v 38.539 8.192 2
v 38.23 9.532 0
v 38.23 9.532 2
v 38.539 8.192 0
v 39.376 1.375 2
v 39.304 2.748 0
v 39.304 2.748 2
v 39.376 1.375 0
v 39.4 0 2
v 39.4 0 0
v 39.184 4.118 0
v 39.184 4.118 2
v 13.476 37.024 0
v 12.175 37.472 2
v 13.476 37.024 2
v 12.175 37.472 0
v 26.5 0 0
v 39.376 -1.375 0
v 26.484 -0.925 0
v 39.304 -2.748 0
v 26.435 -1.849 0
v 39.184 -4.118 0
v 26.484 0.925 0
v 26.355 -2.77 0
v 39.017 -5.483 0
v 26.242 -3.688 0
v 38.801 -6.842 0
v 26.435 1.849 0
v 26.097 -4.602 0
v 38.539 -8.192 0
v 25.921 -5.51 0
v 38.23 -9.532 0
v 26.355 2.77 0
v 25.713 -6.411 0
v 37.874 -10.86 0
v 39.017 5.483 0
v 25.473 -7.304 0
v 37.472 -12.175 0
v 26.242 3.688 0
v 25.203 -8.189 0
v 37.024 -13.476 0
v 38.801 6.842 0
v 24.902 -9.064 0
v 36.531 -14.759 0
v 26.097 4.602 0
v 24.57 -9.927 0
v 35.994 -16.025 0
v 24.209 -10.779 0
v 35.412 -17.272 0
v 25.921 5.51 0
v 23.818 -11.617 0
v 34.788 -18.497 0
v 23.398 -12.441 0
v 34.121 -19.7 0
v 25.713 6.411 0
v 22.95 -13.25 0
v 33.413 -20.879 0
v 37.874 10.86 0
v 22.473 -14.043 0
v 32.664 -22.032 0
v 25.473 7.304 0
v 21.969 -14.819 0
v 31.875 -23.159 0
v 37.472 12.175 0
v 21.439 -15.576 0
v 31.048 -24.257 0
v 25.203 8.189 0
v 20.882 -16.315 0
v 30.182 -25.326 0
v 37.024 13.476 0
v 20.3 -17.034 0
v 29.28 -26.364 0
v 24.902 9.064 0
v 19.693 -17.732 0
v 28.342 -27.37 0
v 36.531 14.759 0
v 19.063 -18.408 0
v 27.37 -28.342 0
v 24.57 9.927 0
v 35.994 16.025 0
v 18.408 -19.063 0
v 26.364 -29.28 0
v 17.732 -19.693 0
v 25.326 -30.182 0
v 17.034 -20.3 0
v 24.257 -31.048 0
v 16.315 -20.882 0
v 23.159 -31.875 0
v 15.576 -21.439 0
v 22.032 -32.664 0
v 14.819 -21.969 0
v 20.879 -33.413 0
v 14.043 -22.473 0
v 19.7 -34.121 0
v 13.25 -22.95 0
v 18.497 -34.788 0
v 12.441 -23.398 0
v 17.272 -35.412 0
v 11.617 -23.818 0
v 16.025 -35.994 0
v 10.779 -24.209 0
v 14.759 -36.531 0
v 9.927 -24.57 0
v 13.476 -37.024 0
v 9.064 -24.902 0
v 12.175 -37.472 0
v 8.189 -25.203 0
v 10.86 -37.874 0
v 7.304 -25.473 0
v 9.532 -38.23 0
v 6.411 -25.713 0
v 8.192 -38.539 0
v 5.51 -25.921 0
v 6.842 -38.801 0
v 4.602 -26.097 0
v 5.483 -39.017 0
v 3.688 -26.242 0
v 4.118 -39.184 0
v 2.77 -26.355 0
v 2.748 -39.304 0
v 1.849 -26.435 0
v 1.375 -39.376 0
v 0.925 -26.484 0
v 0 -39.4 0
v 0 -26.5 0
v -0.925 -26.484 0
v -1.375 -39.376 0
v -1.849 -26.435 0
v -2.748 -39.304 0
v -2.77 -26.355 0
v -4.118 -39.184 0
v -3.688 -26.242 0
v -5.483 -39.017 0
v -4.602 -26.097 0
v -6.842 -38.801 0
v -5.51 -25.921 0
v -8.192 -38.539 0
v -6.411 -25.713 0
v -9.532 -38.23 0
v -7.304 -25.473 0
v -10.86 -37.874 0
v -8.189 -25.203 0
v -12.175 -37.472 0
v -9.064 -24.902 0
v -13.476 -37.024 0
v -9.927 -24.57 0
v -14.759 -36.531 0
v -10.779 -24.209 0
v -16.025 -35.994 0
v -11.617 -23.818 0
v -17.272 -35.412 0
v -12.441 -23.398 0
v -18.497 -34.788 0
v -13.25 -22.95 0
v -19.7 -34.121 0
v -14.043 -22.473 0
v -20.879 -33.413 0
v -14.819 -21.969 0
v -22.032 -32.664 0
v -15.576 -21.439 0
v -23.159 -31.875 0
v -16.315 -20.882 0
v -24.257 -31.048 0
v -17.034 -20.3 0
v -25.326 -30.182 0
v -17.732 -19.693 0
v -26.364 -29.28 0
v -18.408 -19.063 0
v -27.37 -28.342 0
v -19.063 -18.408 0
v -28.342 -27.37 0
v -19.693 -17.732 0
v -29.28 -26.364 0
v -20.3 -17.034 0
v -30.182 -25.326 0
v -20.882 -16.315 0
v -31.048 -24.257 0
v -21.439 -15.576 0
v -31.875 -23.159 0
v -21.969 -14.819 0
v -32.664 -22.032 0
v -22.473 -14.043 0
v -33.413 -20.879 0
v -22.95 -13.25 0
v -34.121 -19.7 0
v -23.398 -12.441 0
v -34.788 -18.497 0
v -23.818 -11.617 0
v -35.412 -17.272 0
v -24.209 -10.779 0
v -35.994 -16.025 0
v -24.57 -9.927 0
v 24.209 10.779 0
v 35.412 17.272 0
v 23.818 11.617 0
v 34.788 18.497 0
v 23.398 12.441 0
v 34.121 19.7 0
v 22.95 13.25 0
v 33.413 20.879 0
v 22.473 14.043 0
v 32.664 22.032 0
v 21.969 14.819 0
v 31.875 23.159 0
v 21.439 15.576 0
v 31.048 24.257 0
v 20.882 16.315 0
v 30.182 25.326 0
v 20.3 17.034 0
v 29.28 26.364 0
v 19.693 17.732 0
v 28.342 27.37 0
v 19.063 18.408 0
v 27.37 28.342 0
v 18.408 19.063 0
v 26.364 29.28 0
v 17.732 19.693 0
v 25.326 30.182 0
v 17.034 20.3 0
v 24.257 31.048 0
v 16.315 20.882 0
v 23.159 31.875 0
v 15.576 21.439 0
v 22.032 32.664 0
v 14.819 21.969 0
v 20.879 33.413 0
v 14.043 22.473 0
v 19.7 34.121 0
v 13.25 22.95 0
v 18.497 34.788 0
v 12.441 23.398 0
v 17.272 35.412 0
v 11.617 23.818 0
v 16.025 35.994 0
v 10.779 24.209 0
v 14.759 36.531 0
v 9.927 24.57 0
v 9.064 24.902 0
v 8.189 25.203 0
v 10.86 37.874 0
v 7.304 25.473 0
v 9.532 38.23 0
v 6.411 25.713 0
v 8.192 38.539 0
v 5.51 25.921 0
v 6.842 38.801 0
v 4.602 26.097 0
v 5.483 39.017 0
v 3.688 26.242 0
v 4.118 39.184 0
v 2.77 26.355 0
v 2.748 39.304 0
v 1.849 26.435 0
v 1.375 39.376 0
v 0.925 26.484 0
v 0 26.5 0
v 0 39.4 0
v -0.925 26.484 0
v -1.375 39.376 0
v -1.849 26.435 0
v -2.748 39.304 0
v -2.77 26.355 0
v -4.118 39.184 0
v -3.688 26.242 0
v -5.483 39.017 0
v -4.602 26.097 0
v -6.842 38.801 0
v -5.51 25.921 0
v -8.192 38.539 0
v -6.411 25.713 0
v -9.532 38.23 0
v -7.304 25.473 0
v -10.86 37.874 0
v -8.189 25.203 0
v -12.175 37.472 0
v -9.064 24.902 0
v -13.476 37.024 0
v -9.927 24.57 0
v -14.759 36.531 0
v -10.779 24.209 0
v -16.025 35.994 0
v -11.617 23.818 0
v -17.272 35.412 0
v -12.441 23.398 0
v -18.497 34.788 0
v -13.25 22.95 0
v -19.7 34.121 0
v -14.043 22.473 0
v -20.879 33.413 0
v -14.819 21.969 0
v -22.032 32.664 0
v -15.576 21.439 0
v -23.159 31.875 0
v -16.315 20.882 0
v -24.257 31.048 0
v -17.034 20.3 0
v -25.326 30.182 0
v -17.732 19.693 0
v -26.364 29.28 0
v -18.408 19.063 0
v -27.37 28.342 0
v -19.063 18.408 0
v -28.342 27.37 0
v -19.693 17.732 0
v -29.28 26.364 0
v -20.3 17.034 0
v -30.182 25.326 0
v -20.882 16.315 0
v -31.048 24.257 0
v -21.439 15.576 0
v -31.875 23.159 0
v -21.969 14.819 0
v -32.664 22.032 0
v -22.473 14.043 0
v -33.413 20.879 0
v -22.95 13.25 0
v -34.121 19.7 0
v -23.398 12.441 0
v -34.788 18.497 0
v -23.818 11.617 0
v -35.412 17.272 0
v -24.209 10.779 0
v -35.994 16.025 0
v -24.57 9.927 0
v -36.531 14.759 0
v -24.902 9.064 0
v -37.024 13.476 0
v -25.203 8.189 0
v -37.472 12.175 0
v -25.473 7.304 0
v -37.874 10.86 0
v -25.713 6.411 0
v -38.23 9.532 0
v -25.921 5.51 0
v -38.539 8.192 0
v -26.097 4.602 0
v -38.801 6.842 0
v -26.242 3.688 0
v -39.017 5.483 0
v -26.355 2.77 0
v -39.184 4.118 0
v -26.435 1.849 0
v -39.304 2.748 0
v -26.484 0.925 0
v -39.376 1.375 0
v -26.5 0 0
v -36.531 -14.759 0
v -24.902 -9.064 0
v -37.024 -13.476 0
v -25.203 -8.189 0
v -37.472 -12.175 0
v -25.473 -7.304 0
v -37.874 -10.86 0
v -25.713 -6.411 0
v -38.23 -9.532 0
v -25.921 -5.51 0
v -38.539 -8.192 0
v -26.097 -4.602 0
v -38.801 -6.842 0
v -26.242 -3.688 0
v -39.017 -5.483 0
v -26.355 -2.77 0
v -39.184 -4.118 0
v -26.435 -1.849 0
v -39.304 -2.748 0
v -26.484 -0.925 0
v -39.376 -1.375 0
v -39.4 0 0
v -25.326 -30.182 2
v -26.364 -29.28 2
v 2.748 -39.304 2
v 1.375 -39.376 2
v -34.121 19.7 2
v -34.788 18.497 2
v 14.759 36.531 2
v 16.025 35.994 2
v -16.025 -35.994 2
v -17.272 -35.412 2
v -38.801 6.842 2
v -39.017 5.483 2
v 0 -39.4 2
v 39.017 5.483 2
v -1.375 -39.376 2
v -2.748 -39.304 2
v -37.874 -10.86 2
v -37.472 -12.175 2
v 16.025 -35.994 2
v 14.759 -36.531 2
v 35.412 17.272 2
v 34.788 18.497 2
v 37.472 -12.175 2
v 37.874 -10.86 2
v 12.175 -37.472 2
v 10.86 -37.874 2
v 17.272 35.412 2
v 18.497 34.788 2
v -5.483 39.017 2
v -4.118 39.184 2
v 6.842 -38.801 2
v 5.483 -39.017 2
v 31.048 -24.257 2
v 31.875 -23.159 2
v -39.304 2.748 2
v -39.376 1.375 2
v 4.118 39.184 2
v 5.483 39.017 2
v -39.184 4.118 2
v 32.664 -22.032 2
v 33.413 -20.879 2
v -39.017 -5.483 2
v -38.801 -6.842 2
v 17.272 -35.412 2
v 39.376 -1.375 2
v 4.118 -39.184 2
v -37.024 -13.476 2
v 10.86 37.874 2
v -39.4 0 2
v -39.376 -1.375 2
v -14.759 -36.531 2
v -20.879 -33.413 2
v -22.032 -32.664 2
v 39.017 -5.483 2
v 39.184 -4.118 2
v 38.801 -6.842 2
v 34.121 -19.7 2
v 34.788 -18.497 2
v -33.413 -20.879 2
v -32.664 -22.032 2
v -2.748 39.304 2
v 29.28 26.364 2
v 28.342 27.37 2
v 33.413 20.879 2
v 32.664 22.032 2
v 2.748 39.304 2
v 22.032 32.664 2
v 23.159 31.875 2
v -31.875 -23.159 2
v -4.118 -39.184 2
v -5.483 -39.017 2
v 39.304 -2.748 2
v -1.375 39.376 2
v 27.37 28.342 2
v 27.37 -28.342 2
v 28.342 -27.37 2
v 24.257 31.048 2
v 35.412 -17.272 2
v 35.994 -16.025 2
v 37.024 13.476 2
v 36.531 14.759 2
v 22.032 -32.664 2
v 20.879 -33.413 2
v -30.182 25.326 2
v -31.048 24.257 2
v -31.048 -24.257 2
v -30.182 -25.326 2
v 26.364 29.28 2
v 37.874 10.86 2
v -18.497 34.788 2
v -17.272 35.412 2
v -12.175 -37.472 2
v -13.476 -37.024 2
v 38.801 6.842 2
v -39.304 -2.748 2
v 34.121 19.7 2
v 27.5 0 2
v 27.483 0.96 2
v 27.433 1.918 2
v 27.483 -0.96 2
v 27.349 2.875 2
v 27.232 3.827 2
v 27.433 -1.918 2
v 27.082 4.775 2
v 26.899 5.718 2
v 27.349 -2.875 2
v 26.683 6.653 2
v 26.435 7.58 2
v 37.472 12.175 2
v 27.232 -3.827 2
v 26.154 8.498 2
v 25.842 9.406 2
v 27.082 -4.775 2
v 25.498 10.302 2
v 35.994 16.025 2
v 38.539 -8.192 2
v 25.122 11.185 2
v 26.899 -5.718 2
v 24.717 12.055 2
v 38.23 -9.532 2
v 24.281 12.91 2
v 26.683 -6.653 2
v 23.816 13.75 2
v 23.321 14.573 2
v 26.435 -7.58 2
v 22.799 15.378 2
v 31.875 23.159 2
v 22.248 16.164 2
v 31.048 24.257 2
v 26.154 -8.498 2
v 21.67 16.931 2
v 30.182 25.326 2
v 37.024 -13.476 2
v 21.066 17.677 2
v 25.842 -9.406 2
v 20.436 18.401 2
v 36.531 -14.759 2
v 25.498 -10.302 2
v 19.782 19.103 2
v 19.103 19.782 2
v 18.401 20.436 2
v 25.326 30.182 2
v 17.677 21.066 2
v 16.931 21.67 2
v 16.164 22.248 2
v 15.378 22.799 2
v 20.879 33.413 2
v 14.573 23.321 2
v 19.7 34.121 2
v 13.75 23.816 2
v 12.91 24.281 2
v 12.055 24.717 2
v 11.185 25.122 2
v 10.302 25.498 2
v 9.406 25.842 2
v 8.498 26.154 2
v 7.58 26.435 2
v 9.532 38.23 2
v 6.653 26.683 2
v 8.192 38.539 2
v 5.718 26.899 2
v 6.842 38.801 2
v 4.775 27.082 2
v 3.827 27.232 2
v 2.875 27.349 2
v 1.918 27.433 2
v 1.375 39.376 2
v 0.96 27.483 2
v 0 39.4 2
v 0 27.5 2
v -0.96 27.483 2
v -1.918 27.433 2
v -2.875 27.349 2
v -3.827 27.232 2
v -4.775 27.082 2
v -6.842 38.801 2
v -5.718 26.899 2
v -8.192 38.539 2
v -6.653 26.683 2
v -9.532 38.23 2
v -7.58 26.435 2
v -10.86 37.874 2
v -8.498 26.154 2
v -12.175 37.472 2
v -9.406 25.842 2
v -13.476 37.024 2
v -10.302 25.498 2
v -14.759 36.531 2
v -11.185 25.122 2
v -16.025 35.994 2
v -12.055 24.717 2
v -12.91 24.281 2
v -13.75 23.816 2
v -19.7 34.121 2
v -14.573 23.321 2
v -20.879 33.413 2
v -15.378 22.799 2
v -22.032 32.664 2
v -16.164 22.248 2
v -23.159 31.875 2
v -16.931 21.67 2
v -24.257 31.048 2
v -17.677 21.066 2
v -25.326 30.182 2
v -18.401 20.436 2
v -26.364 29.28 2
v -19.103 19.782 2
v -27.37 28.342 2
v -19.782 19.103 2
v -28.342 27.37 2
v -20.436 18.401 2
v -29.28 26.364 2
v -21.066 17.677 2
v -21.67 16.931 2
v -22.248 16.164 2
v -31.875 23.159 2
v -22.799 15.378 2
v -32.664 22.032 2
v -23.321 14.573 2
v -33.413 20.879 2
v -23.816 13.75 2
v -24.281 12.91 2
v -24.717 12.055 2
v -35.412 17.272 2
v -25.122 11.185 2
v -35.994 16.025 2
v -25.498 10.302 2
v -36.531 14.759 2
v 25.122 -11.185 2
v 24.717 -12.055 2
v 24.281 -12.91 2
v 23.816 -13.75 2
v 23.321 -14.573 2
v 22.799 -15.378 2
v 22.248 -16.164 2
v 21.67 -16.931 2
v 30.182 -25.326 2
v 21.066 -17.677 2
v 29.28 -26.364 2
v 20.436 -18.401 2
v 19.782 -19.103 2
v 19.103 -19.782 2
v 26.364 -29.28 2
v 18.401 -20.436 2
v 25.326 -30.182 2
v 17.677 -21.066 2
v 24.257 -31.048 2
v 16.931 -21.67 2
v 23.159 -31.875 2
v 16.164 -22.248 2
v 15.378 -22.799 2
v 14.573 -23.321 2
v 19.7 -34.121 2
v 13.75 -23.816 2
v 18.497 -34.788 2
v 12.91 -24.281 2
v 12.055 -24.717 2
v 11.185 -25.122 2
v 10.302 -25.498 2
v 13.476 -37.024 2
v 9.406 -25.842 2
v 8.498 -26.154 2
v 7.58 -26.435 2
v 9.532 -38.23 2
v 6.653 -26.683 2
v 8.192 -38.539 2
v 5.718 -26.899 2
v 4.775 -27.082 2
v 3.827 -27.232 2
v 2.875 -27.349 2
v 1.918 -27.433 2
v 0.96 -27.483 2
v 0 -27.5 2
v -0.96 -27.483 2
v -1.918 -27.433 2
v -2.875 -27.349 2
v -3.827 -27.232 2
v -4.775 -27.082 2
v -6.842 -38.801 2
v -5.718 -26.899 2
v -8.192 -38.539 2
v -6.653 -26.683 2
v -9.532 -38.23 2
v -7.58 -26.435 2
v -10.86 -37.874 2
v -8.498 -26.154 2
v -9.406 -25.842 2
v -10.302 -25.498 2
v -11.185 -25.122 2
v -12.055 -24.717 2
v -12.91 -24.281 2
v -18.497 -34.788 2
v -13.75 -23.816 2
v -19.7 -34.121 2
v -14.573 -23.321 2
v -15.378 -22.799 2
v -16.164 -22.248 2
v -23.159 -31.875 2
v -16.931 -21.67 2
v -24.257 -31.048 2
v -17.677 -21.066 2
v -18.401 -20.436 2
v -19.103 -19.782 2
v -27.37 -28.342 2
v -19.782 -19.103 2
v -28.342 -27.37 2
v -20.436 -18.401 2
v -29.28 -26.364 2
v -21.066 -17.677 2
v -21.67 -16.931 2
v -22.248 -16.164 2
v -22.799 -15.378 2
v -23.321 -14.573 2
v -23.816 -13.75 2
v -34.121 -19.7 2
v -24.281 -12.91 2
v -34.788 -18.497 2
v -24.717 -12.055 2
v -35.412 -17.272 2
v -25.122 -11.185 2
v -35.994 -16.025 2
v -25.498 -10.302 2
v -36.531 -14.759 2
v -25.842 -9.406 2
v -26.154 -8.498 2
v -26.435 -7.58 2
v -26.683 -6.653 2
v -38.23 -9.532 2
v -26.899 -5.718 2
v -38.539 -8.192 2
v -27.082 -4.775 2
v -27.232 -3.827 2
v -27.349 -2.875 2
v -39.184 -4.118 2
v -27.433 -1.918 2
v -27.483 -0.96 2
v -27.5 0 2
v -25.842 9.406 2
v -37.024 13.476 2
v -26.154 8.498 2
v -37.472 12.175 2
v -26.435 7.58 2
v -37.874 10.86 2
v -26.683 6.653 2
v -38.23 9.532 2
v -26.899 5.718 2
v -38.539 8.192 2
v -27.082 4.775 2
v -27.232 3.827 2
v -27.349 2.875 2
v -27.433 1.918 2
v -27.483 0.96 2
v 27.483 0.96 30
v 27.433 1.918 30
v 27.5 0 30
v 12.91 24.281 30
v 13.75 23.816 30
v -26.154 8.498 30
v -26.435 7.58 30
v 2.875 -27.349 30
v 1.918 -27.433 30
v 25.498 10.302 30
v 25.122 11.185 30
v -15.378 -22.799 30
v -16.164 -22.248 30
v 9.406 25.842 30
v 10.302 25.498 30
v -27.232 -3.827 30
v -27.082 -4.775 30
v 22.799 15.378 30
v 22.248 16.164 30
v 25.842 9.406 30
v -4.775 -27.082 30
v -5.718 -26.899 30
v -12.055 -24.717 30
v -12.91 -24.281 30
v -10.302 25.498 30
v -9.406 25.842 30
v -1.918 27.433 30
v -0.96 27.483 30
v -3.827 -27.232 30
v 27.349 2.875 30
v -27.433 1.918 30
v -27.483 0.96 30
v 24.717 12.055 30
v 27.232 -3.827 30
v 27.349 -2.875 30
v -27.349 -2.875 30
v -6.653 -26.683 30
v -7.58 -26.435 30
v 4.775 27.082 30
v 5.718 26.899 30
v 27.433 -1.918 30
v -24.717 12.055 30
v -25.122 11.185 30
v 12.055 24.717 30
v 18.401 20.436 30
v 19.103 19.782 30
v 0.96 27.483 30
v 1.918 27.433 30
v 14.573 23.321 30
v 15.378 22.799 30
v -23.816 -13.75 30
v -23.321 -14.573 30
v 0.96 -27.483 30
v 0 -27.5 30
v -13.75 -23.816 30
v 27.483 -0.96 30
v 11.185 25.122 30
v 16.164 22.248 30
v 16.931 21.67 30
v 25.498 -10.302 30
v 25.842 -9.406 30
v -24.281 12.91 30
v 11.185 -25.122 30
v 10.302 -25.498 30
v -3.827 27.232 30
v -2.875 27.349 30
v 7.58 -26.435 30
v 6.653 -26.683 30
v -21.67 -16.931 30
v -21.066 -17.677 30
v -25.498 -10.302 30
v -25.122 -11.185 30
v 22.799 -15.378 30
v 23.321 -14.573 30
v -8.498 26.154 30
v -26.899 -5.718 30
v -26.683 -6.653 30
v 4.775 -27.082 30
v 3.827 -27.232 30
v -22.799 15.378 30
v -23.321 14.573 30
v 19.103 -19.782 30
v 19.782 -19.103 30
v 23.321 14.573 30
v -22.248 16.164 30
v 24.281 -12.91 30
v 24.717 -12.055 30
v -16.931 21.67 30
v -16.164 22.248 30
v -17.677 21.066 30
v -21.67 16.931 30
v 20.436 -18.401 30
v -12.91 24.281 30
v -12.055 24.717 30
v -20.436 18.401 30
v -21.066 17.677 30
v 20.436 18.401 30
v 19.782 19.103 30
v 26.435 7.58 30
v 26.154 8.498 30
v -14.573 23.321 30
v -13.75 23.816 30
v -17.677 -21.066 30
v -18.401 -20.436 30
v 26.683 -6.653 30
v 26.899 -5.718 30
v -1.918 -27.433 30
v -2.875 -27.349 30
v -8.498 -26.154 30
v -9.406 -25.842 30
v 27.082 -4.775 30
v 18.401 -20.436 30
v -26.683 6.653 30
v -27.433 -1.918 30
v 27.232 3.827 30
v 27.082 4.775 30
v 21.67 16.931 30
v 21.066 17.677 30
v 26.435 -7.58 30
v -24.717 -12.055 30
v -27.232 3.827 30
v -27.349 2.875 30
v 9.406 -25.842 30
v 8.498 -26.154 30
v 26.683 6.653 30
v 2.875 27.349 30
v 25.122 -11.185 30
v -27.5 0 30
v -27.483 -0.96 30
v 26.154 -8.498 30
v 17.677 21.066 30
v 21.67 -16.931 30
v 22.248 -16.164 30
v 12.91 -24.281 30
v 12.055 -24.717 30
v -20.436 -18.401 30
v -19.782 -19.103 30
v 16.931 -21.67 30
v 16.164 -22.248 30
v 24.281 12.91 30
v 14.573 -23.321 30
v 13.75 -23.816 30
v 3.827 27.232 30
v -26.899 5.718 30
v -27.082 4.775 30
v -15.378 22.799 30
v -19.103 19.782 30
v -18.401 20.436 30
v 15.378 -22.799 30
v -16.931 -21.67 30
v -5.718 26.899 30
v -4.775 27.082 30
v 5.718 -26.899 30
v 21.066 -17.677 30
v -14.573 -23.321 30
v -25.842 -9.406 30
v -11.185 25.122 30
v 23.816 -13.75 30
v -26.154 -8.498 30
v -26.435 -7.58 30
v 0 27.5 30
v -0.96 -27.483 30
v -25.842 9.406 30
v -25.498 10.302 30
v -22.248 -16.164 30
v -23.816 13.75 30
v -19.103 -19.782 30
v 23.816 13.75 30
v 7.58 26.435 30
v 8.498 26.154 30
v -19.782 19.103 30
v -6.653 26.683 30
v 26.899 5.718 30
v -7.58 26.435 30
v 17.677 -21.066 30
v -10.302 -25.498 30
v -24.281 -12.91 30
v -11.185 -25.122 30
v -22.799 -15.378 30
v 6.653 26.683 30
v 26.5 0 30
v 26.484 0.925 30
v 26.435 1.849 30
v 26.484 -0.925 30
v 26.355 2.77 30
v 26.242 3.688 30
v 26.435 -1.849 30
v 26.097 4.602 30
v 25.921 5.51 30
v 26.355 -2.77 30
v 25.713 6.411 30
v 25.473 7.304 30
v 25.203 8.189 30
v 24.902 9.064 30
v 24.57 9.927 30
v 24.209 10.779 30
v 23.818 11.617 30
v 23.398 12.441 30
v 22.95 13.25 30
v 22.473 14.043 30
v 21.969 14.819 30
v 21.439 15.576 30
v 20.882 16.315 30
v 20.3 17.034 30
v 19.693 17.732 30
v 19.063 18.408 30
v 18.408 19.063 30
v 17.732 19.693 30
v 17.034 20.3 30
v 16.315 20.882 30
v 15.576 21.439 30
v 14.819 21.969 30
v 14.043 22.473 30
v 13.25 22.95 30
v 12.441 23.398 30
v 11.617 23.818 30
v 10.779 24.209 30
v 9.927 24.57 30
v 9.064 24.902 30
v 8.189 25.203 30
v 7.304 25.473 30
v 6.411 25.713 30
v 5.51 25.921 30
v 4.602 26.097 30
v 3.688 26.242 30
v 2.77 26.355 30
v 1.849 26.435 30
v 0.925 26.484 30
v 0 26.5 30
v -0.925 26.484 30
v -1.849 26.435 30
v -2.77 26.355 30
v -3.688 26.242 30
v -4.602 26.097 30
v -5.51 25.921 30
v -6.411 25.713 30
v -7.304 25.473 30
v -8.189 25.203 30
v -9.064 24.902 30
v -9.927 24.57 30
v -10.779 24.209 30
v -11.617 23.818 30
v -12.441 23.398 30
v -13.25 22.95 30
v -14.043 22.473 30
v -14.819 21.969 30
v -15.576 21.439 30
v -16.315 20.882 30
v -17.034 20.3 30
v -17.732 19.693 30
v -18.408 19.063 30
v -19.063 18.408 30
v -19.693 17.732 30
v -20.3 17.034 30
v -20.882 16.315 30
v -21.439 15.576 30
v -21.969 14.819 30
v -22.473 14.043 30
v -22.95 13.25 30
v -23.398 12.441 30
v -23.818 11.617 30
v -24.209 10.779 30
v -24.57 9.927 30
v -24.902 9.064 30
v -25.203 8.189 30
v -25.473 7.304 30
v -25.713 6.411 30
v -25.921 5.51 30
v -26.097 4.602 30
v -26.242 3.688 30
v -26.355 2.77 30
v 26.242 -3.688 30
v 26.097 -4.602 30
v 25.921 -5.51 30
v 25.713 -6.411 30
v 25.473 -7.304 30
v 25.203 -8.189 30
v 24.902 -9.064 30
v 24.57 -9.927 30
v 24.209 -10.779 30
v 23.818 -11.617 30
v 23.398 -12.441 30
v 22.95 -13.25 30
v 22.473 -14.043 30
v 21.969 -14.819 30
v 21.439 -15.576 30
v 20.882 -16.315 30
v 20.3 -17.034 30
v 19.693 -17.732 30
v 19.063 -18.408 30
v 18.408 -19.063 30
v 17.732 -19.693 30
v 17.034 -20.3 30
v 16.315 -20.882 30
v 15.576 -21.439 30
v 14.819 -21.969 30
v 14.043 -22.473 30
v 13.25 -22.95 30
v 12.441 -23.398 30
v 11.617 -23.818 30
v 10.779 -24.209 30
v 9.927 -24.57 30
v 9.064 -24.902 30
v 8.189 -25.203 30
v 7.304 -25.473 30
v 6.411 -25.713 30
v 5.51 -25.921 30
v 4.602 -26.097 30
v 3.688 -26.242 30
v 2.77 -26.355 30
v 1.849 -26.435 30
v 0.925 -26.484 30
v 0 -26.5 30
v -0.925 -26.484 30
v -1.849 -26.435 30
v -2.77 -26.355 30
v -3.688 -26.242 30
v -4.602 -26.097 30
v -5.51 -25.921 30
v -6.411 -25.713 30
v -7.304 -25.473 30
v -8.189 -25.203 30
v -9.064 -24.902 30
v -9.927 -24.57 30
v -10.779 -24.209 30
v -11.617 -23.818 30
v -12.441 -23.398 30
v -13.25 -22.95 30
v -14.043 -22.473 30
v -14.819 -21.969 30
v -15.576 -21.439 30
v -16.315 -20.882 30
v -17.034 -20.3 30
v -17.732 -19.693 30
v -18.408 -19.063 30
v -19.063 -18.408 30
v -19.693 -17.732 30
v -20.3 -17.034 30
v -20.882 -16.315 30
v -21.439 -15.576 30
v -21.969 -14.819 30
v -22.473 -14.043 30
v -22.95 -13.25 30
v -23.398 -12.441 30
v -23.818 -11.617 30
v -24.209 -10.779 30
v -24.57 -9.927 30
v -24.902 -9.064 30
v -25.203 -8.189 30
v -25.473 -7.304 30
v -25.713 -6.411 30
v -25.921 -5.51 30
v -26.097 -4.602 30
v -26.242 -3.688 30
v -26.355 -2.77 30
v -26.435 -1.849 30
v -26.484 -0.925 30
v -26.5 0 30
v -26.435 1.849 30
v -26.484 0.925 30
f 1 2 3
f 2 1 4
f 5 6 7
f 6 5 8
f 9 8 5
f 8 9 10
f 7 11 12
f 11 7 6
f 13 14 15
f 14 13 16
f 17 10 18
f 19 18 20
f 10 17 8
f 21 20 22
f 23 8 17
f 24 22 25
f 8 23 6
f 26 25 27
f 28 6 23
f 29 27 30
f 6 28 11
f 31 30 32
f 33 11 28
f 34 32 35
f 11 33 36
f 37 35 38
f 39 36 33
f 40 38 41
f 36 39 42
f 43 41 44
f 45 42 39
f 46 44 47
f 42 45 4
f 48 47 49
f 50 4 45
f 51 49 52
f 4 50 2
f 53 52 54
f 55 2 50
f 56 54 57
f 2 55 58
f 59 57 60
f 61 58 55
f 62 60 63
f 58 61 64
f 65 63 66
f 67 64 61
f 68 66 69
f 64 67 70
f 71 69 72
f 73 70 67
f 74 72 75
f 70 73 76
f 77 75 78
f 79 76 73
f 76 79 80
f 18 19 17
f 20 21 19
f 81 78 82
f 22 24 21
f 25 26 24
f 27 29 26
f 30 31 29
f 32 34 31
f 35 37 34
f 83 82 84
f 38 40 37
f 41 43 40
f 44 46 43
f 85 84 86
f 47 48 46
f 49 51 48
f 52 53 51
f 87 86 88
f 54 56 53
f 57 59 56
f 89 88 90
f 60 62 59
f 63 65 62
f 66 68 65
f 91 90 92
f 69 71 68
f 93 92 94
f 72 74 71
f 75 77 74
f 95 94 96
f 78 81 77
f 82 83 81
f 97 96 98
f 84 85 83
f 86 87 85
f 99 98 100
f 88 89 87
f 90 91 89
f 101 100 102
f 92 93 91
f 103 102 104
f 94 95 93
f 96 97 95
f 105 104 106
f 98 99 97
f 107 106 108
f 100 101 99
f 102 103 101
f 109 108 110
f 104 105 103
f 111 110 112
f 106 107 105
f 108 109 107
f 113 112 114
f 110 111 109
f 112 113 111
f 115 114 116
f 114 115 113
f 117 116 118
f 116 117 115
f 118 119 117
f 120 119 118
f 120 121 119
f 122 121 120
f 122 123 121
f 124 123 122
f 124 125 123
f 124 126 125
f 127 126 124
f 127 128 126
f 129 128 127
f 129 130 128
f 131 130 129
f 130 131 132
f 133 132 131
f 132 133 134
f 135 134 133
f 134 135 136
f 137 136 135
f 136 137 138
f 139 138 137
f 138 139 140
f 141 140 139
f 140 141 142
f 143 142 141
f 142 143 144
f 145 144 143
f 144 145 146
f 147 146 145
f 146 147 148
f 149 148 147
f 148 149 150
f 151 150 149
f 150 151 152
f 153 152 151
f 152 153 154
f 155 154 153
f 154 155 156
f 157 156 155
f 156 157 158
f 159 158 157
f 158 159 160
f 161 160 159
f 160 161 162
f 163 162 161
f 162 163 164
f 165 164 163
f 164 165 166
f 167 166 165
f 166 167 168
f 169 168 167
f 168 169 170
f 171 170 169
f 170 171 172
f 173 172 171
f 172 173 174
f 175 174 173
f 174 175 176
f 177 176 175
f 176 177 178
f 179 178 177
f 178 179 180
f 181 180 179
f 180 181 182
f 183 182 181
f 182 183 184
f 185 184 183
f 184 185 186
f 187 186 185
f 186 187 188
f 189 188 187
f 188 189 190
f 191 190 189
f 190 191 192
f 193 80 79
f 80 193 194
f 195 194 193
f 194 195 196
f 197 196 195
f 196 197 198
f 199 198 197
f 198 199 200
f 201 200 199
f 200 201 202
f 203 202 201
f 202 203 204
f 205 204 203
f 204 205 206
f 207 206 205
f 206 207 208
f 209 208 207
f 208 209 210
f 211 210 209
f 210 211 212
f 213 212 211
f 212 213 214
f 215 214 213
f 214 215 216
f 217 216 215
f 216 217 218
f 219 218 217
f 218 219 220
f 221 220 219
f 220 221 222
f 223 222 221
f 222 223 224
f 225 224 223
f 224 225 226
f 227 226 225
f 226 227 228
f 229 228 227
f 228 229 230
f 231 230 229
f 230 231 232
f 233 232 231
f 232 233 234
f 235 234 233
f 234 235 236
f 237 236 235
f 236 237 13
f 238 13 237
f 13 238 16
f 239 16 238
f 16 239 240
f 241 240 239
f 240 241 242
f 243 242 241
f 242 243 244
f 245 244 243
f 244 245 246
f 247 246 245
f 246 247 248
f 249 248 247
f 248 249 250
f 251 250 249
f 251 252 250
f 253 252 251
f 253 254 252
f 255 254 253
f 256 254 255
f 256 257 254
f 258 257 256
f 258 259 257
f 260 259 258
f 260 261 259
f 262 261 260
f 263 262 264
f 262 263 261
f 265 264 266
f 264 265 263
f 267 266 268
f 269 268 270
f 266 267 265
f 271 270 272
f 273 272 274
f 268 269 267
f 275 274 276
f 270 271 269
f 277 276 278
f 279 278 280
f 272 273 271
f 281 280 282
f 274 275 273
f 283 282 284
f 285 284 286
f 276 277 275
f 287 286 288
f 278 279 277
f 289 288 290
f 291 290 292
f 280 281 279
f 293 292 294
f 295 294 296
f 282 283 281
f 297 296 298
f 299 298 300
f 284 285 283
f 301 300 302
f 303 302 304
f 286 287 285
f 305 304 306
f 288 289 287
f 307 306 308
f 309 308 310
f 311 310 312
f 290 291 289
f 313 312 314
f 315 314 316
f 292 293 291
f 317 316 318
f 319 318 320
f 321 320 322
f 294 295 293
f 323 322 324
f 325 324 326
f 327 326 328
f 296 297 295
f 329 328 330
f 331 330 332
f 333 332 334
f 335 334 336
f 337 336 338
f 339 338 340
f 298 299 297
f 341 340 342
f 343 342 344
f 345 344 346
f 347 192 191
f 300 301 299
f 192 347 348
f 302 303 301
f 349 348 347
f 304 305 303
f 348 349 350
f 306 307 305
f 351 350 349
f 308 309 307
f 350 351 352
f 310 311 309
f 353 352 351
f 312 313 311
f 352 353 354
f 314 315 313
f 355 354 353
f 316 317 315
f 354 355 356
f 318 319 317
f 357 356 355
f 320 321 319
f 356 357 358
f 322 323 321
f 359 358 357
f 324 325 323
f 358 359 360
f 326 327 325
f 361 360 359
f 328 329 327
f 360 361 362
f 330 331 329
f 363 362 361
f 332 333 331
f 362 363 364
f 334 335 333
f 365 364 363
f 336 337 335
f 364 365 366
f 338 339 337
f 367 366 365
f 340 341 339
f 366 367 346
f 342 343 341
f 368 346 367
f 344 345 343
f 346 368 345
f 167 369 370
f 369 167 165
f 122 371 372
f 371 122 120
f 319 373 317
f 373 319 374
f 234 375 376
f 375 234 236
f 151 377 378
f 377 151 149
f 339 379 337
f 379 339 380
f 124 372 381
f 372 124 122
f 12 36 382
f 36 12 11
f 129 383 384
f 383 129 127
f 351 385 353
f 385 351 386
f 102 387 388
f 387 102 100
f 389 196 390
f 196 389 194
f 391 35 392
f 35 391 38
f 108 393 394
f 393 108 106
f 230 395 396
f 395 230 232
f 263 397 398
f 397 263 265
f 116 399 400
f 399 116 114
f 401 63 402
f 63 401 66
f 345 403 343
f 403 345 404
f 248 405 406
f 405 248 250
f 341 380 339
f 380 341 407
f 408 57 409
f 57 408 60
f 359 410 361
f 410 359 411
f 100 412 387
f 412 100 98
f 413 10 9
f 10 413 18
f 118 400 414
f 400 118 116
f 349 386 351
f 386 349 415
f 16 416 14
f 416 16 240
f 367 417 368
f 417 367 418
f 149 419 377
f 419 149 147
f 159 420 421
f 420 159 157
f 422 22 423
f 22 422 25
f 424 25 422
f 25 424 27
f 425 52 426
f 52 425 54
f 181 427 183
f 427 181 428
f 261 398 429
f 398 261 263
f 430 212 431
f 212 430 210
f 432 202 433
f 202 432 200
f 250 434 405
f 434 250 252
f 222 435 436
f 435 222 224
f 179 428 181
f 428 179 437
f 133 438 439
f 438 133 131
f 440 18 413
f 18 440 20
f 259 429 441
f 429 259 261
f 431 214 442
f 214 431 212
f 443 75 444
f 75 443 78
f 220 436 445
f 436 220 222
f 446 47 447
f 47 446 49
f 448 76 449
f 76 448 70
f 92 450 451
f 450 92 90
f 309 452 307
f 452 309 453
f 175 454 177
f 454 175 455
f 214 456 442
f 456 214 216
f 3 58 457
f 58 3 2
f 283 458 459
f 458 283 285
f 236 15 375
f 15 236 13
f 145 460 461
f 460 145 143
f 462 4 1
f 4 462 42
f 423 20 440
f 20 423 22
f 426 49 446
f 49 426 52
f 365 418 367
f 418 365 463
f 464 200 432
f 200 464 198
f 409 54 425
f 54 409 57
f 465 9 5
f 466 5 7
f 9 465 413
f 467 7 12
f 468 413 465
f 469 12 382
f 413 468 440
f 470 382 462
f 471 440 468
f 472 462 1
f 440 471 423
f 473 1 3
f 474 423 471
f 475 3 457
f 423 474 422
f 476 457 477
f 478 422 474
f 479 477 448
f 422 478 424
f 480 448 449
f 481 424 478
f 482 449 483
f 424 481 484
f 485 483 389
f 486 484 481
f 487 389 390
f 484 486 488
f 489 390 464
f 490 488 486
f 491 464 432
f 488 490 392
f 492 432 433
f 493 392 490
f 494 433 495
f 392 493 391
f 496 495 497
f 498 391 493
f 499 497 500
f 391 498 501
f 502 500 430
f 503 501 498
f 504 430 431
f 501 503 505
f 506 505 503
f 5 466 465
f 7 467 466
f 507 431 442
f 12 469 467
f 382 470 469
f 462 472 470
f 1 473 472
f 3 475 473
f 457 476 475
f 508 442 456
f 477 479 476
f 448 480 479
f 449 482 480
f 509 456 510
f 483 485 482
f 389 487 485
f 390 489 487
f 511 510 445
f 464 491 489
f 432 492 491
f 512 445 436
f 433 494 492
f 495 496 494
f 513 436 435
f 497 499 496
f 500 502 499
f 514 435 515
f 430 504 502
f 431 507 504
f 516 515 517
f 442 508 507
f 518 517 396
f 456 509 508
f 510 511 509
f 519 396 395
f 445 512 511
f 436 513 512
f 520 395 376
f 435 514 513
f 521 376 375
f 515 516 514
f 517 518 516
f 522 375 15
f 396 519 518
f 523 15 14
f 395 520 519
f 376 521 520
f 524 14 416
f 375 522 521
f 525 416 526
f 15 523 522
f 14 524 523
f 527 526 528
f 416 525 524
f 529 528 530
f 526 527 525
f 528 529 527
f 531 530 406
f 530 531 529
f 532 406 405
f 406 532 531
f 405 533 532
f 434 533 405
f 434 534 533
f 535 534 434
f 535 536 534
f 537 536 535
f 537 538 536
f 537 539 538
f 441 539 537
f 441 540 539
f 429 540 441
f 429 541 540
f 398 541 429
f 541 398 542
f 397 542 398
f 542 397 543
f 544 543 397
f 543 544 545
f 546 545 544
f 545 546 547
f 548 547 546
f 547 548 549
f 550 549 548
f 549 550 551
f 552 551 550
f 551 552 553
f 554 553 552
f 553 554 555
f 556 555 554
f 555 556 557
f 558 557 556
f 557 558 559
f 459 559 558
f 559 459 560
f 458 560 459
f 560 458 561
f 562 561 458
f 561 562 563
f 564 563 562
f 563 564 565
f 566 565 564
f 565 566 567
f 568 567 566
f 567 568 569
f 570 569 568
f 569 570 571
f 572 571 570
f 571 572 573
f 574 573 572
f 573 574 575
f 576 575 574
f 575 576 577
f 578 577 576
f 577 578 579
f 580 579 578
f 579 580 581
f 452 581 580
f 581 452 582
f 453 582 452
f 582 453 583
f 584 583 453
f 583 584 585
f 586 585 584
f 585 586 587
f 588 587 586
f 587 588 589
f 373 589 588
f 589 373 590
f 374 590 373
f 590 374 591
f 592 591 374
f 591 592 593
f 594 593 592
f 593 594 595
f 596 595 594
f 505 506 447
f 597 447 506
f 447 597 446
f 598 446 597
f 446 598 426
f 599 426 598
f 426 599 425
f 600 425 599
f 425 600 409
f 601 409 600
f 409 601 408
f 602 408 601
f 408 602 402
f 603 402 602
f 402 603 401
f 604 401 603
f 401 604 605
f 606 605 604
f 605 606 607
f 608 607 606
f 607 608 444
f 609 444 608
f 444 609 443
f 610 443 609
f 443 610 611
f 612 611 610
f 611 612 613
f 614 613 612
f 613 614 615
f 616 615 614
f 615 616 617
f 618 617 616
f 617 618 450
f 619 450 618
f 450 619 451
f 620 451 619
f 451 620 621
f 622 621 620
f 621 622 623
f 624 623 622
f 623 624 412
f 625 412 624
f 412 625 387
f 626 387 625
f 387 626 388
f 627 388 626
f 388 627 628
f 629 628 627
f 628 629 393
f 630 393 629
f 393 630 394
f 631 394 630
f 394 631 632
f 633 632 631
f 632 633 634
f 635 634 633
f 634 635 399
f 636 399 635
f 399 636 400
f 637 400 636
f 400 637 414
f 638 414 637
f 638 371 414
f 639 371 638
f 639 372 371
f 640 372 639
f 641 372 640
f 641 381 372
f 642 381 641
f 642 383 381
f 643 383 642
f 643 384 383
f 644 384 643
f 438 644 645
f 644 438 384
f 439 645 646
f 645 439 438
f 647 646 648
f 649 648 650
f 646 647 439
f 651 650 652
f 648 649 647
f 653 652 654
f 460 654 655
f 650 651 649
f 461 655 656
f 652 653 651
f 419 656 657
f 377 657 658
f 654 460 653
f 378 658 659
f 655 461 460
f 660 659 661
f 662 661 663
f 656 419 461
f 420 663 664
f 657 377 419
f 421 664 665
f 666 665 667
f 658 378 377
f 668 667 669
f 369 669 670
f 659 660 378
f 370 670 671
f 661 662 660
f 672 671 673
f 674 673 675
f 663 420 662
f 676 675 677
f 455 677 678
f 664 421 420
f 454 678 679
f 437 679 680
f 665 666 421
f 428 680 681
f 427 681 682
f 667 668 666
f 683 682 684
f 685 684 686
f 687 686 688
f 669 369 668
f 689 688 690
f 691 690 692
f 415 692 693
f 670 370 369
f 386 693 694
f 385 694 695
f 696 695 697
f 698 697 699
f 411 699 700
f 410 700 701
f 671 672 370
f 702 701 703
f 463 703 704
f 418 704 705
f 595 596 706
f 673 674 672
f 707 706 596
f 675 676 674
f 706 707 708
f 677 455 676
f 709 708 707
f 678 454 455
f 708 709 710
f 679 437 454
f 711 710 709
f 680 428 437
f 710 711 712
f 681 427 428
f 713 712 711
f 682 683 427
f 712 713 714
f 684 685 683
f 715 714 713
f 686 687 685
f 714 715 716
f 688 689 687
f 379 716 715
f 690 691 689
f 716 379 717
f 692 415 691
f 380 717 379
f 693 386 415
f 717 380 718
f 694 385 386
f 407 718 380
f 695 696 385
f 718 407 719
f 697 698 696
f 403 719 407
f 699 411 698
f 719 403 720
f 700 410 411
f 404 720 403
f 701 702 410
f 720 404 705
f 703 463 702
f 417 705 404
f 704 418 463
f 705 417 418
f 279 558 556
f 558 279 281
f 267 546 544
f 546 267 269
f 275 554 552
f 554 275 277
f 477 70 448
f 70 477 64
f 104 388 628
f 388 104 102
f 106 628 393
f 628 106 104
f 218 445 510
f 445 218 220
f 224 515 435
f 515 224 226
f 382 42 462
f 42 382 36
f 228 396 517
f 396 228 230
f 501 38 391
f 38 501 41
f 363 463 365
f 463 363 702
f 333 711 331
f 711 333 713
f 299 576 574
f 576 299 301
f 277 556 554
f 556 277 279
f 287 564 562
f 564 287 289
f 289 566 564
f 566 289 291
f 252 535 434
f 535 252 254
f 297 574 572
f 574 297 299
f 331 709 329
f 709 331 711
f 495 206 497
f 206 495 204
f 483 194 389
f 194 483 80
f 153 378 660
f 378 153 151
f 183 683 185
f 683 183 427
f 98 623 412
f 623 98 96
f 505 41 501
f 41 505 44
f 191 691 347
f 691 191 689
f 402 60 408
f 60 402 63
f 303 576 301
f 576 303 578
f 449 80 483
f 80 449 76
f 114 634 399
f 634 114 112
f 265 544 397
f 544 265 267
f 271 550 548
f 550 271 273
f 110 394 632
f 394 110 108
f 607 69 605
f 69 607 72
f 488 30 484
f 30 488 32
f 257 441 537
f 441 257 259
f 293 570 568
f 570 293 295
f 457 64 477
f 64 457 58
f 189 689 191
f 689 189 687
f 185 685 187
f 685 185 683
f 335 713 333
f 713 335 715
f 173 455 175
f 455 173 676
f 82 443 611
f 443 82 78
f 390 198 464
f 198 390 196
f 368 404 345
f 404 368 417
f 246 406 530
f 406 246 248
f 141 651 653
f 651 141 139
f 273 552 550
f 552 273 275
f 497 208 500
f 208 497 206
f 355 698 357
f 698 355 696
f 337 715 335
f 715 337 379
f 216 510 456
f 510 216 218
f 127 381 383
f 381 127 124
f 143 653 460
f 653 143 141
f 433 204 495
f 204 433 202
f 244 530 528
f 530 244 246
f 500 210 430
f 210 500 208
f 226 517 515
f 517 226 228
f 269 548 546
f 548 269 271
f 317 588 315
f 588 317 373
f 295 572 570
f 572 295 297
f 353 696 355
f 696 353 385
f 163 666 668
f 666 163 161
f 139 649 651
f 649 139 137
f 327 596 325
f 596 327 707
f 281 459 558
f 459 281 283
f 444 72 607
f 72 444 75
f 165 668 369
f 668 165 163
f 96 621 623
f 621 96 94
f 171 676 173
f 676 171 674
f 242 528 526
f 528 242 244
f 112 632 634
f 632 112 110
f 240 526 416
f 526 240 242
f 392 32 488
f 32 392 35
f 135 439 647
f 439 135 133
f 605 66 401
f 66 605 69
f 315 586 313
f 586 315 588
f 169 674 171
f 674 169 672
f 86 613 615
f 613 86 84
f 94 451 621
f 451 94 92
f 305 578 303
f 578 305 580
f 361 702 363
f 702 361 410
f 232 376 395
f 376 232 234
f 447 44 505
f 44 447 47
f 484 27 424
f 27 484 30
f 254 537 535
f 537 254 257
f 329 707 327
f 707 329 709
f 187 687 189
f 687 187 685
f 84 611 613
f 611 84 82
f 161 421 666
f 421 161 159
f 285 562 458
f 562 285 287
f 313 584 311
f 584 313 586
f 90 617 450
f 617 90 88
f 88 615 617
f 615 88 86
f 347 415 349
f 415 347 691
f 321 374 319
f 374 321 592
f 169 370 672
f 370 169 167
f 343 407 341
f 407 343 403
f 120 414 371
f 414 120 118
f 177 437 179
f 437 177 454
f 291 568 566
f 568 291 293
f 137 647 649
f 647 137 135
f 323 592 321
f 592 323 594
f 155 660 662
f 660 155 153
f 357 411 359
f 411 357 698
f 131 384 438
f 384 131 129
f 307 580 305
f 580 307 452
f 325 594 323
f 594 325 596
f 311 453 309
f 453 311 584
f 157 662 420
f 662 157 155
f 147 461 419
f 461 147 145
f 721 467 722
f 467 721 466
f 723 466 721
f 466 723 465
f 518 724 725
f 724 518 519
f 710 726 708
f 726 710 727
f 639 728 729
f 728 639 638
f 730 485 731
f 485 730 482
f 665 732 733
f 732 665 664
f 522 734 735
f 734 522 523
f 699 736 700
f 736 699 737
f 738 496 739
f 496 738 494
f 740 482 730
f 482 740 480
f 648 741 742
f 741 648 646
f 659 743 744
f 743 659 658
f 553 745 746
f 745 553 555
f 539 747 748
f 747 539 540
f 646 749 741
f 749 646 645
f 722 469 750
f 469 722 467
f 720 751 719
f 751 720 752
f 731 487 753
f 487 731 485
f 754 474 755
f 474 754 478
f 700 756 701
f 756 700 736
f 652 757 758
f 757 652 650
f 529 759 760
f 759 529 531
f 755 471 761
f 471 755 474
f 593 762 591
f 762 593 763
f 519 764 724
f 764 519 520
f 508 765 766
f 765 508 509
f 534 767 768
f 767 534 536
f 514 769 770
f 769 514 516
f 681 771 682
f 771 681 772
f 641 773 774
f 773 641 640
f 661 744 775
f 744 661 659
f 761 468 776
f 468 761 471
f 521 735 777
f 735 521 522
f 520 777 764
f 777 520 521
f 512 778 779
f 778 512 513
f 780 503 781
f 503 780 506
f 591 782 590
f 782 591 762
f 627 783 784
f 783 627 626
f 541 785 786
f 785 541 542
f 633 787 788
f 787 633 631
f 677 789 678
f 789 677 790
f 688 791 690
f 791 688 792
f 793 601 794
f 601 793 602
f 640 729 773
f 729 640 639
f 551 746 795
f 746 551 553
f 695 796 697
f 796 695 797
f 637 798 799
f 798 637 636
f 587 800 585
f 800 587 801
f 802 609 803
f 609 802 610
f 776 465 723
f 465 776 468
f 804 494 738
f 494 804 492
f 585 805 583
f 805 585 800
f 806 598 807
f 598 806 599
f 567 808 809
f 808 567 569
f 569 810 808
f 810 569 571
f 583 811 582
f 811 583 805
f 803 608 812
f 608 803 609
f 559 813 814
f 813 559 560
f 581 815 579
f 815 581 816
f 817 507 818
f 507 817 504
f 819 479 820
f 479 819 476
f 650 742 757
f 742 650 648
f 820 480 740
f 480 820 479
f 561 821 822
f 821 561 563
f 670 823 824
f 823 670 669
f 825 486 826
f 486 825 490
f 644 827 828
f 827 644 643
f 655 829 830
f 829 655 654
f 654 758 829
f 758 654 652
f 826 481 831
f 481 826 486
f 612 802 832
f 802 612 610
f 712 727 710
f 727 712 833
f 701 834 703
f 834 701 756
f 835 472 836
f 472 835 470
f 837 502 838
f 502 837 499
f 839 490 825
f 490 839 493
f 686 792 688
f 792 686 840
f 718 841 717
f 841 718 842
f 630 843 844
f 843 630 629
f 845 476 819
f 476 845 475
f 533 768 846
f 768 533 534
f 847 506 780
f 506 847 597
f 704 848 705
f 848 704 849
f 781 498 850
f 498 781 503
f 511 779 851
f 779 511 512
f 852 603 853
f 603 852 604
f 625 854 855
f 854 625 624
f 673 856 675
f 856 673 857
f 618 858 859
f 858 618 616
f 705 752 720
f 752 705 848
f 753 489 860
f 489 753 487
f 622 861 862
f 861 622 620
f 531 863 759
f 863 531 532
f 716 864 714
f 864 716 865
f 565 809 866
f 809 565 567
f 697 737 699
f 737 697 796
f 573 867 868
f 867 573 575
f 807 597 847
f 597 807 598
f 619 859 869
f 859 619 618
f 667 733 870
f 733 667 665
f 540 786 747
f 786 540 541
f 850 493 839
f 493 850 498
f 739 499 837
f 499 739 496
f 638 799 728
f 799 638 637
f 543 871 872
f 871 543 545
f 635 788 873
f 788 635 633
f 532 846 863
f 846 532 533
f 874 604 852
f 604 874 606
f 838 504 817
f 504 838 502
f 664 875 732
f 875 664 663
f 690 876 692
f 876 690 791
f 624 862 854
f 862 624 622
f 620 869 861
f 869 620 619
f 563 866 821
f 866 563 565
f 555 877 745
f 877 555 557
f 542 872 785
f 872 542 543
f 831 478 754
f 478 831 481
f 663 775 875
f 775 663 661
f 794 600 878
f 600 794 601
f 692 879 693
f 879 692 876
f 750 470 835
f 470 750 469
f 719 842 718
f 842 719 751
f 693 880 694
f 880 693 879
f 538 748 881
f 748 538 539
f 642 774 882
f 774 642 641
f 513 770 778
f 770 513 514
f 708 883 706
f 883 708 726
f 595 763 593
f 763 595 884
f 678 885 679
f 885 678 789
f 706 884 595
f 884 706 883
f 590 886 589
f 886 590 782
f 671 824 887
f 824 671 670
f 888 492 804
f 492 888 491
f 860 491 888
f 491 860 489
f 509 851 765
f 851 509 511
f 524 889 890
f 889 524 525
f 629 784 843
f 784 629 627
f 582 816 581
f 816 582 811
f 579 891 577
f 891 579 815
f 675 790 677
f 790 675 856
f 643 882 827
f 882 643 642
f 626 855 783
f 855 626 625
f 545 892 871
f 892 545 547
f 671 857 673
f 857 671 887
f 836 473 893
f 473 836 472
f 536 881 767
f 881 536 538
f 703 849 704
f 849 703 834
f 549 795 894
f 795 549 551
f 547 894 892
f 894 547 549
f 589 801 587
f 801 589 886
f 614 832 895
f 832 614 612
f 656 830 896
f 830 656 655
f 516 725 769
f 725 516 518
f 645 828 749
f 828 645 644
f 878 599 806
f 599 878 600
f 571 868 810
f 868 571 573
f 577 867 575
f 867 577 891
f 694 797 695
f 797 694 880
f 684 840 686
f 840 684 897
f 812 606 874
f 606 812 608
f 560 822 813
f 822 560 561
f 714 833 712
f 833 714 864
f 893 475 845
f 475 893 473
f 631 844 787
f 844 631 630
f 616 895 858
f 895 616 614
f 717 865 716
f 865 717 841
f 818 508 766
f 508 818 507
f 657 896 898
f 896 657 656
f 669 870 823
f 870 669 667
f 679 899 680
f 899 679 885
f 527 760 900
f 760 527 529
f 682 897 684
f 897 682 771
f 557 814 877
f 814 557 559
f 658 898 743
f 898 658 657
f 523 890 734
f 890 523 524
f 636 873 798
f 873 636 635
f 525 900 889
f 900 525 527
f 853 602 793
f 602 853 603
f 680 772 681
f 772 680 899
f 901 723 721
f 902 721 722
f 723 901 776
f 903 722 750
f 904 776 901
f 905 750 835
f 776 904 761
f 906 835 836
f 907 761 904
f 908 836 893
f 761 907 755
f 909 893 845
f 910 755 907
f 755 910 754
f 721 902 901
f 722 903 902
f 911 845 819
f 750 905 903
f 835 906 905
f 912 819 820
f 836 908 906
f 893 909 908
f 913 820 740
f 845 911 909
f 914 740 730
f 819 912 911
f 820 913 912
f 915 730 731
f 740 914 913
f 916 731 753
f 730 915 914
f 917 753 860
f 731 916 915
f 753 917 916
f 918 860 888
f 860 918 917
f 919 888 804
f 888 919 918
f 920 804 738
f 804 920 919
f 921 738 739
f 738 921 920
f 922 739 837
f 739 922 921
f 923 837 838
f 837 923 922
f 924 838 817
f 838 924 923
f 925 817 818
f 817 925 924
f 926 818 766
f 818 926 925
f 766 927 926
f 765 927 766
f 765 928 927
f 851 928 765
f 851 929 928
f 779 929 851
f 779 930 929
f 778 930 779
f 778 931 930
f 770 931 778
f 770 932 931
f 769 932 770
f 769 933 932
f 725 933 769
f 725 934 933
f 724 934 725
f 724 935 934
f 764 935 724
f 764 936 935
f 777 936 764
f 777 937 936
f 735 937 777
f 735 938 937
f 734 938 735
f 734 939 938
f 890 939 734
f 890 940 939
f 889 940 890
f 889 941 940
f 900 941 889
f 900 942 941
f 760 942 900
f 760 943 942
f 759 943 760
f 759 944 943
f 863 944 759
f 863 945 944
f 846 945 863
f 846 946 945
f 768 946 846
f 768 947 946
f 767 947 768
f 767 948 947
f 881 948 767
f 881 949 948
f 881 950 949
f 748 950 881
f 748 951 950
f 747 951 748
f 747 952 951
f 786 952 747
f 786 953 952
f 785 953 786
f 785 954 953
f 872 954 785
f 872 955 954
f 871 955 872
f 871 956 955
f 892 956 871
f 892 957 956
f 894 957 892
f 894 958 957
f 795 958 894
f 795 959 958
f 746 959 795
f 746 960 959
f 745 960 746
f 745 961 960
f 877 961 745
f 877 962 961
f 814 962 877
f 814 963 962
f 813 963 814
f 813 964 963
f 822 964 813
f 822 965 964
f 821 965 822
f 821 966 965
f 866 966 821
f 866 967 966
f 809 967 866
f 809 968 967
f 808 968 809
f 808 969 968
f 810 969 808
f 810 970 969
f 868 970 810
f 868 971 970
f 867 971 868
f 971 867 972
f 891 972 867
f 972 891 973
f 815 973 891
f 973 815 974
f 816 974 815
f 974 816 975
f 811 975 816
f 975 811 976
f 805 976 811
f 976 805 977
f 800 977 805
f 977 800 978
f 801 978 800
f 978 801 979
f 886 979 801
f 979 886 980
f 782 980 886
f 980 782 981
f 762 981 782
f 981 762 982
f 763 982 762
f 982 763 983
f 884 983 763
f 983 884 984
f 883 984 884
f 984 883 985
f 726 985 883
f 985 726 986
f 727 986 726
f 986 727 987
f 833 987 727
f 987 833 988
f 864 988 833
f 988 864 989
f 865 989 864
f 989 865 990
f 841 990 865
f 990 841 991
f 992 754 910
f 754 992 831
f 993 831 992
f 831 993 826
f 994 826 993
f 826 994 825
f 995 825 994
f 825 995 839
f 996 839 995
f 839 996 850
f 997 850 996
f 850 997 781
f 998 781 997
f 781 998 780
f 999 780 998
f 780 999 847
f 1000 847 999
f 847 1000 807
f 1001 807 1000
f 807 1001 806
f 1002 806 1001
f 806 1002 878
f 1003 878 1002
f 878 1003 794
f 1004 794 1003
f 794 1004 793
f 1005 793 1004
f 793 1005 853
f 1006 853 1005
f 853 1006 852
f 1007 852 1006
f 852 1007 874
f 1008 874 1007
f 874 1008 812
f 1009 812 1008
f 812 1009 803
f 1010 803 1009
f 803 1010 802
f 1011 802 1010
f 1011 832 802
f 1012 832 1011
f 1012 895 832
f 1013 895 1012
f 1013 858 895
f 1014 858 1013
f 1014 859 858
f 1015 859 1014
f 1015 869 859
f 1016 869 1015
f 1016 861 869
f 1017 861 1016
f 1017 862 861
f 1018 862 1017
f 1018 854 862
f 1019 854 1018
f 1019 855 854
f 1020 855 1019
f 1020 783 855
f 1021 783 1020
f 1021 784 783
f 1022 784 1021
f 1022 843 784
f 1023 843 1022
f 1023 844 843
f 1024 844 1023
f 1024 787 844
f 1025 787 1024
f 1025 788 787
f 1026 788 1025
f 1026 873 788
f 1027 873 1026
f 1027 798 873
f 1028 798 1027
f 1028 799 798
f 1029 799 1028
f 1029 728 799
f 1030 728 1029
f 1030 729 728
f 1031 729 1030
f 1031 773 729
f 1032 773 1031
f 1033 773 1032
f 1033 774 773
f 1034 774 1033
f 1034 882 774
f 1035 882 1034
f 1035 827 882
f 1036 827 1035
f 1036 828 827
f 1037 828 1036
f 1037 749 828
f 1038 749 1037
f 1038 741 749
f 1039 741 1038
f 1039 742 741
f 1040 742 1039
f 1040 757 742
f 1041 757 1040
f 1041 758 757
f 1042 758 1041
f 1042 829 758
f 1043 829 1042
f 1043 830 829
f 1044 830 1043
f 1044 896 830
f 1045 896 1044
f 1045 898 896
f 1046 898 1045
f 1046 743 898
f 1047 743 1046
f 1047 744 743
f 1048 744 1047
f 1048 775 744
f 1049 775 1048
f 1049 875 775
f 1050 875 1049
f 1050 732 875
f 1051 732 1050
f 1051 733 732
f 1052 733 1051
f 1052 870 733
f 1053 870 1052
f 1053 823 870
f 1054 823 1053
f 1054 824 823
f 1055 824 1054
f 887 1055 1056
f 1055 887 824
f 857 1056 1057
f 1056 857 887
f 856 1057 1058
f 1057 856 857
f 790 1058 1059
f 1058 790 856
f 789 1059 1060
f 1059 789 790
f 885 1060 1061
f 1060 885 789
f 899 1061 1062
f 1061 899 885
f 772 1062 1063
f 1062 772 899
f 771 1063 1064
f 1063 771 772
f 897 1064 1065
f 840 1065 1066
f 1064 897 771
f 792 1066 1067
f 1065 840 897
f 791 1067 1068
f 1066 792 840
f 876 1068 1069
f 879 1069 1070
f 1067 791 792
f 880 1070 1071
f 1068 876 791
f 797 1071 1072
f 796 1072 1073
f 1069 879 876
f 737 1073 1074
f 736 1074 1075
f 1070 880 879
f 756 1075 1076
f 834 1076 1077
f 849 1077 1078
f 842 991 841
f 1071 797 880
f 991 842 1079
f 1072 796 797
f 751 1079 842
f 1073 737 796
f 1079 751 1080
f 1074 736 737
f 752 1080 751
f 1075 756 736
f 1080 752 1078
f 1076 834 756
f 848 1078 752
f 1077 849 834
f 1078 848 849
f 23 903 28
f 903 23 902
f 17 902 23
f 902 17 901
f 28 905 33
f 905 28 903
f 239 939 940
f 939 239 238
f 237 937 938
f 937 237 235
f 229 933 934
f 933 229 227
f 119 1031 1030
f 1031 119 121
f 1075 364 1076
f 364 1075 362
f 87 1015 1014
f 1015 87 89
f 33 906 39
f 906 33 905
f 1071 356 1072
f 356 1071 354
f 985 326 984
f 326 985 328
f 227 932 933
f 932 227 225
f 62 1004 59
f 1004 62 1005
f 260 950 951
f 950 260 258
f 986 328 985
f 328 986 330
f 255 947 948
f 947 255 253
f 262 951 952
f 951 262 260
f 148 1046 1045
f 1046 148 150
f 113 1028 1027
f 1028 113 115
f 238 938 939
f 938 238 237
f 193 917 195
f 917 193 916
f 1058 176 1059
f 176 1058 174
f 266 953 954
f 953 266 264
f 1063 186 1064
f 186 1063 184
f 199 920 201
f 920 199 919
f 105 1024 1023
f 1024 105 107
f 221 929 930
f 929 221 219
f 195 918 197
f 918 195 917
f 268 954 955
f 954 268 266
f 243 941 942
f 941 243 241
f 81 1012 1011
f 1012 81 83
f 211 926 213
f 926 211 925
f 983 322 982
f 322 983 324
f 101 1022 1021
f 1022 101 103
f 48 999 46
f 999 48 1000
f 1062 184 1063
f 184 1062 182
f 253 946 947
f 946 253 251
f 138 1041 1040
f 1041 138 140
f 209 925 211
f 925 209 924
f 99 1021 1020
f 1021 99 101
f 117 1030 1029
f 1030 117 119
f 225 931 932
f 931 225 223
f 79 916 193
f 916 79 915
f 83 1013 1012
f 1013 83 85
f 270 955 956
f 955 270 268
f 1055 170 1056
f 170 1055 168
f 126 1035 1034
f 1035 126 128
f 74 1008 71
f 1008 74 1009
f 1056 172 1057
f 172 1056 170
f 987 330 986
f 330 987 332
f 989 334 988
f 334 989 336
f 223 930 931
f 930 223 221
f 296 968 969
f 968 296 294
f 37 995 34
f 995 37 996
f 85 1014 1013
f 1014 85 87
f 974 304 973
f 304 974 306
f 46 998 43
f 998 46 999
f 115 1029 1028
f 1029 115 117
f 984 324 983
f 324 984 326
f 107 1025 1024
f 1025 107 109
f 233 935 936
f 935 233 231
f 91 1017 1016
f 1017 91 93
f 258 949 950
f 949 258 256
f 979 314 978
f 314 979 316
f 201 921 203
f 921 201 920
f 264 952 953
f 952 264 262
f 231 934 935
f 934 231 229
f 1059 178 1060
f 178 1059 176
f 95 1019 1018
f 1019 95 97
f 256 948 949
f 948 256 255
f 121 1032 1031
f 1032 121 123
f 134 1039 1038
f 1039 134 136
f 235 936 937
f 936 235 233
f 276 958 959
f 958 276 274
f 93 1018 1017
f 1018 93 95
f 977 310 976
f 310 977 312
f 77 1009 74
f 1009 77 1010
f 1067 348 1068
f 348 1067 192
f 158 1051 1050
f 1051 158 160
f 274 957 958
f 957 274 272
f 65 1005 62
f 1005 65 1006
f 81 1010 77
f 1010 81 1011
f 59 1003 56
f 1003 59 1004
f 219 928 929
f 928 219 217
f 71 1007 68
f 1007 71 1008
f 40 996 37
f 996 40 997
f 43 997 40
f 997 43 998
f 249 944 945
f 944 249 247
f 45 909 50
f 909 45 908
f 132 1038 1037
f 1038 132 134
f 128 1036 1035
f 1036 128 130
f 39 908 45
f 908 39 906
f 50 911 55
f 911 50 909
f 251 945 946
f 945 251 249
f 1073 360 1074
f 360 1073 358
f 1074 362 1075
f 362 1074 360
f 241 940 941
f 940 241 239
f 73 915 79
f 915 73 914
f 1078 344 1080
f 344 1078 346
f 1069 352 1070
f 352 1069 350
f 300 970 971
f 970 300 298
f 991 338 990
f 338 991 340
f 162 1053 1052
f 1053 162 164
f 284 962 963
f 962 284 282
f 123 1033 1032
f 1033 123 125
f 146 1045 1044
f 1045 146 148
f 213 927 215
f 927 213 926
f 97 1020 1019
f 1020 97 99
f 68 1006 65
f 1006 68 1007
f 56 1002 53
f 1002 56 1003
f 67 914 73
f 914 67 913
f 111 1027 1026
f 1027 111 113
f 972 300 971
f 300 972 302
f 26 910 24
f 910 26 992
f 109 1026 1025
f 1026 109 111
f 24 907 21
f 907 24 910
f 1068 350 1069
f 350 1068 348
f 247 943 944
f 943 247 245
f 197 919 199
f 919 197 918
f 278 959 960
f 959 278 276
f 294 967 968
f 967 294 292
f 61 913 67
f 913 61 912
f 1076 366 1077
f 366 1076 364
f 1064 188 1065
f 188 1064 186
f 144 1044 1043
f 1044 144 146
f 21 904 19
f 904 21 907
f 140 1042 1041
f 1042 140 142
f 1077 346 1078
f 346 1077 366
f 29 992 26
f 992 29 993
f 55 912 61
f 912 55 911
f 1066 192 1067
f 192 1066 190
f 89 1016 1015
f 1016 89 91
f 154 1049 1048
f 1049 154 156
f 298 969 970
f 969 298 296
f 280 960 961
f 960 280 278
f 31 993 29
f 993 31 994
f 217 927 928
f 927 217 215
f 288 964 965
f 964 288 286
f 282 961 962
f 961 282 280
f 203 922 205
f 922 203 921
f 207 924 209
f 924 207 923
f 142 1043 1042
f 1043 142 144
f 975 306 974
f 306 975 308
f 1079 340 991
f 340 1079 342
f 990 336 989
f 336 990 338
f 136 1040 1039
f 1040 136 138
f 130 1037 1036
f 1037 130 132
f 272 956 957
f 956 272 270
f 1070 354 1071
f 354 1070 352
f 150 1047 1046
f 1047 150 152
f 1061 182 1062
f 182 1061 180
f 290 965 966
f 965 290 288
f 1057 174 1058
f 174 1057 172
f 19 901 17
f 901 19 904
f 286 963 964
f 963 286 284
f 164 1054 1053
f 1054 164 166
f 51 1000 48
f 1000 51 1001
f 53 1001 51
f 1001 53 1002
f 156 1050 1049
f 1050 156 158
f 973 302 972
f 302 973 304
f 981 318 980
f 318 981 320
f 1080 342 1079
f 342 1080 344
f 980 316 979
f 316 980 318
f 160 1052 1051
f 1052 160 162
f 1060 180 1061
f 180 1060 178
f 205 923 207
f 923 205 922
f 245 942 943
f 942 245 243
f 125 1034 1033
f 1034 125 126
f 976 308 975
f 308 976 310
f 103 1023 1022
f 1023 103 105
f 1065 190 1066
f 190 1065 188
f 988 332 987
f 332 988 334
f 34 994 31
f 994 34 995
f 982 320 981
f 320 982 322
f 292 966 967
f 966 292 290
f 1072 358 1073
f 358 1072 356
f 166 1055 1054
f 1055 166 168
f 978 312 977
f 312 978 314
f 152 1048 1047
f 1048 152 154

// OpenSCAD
x = 51;
y = 51;
z = 1;

fen_x = 12; // fenestrations on x axis
fen_y = 12; // fenestrations on y axis
fen_size = 4; // size of fenestrations as a % of total axis size

// calculate fenestration size
fen_size_x = fen_size * x / 100;
fen_size_y = fen_size * y / 100;

// calculate space remaining and then divide by number of windows needed + 1 to get the desired size of the struts
strut_x = (x - fen_x * fen_size_x) / (fen_x + 1);
strut_y = (y - fen_y * fen_size_y) / (fen_y + 1);

//cover();
base();

module base() {
    union() {
        difference() {
            cylinder(r=39.4, h=2, center=false, $fn=180);
            cylinder(r=27.5, h=2, center=false, $fn=180);
        }
        difference() {
            cylinder(r=27.5, h=30, center=false, $fn=180);
            cylinder(r=26.5, h=30, center=false, $fn=180);
        }
    }
}

module cover() {
    union() {
        difference() {
            cylinder(r=41, h=27, center=false, $fn=180);
            translate([0,0,z]) cylinder(r=38.5, h=27-z, center=false, $fn=180);
            cylinder(r=x/2-0.5, h=z, center=false, $fn=180);
            translate([0,0,27-z]) cylinder(r=39.5, h=2, center=true, $fn=180);
        }
        translate([-7.5,30,0]) cube([15,2,24]);
        translate([27.5,-8,0]) cube([2,16,24]);
        translate([-x/2,-y/2,0]) front_grid();
        translate([0,0,z-1]) difference() {
            union() {
                difference() {
                    cylinder(r=28, h=4, center=false);
                    cylinder(r=26.5, h=4, center=false);
                }
                translate([0,0,3]) difference() {
                    cylinder(r=28, h=1, center=false);
                    cylinder(r=25, h=1, center=false);
                    cylinder(r1=25.8, r2=26.5, h=1, center=false);
                }
            }
            translate([-28,-8,0]) cube([56,16,4]);
            translate([-8,-28,0]) cube([16,56,4]);
        }
    }
}

module front_grid() {
    // take away windows from fenestrated surface
    difference() {
        cube(size=[x, y, z]); // fenestrated surface
        difference() {
            cube(size=[x, y, z]); // fenestrated surface
            translate([x/2,y/2,0]) cylinder(r=x/2, h=z, center=false);
        }
        for (i = [0:fen_x - 1]) {
            translate([i * (fen_size_x + strut_x) + strut_x, 0, 0])
            for (i = [0:fen_y - 1]) {
                translate([0, i * (fen_size_y + strut_y) + strut_x, 0])
                //cube([fen_size_x, fen_size_y, z+2]); // the fenestrations have to start a bit lower and be a bit taller, so that we don't get 0 sized objects
                cylinder(r=fen_size_x/2, h=z+2, center=false, $fn=24);
            }
        }

    }
}
